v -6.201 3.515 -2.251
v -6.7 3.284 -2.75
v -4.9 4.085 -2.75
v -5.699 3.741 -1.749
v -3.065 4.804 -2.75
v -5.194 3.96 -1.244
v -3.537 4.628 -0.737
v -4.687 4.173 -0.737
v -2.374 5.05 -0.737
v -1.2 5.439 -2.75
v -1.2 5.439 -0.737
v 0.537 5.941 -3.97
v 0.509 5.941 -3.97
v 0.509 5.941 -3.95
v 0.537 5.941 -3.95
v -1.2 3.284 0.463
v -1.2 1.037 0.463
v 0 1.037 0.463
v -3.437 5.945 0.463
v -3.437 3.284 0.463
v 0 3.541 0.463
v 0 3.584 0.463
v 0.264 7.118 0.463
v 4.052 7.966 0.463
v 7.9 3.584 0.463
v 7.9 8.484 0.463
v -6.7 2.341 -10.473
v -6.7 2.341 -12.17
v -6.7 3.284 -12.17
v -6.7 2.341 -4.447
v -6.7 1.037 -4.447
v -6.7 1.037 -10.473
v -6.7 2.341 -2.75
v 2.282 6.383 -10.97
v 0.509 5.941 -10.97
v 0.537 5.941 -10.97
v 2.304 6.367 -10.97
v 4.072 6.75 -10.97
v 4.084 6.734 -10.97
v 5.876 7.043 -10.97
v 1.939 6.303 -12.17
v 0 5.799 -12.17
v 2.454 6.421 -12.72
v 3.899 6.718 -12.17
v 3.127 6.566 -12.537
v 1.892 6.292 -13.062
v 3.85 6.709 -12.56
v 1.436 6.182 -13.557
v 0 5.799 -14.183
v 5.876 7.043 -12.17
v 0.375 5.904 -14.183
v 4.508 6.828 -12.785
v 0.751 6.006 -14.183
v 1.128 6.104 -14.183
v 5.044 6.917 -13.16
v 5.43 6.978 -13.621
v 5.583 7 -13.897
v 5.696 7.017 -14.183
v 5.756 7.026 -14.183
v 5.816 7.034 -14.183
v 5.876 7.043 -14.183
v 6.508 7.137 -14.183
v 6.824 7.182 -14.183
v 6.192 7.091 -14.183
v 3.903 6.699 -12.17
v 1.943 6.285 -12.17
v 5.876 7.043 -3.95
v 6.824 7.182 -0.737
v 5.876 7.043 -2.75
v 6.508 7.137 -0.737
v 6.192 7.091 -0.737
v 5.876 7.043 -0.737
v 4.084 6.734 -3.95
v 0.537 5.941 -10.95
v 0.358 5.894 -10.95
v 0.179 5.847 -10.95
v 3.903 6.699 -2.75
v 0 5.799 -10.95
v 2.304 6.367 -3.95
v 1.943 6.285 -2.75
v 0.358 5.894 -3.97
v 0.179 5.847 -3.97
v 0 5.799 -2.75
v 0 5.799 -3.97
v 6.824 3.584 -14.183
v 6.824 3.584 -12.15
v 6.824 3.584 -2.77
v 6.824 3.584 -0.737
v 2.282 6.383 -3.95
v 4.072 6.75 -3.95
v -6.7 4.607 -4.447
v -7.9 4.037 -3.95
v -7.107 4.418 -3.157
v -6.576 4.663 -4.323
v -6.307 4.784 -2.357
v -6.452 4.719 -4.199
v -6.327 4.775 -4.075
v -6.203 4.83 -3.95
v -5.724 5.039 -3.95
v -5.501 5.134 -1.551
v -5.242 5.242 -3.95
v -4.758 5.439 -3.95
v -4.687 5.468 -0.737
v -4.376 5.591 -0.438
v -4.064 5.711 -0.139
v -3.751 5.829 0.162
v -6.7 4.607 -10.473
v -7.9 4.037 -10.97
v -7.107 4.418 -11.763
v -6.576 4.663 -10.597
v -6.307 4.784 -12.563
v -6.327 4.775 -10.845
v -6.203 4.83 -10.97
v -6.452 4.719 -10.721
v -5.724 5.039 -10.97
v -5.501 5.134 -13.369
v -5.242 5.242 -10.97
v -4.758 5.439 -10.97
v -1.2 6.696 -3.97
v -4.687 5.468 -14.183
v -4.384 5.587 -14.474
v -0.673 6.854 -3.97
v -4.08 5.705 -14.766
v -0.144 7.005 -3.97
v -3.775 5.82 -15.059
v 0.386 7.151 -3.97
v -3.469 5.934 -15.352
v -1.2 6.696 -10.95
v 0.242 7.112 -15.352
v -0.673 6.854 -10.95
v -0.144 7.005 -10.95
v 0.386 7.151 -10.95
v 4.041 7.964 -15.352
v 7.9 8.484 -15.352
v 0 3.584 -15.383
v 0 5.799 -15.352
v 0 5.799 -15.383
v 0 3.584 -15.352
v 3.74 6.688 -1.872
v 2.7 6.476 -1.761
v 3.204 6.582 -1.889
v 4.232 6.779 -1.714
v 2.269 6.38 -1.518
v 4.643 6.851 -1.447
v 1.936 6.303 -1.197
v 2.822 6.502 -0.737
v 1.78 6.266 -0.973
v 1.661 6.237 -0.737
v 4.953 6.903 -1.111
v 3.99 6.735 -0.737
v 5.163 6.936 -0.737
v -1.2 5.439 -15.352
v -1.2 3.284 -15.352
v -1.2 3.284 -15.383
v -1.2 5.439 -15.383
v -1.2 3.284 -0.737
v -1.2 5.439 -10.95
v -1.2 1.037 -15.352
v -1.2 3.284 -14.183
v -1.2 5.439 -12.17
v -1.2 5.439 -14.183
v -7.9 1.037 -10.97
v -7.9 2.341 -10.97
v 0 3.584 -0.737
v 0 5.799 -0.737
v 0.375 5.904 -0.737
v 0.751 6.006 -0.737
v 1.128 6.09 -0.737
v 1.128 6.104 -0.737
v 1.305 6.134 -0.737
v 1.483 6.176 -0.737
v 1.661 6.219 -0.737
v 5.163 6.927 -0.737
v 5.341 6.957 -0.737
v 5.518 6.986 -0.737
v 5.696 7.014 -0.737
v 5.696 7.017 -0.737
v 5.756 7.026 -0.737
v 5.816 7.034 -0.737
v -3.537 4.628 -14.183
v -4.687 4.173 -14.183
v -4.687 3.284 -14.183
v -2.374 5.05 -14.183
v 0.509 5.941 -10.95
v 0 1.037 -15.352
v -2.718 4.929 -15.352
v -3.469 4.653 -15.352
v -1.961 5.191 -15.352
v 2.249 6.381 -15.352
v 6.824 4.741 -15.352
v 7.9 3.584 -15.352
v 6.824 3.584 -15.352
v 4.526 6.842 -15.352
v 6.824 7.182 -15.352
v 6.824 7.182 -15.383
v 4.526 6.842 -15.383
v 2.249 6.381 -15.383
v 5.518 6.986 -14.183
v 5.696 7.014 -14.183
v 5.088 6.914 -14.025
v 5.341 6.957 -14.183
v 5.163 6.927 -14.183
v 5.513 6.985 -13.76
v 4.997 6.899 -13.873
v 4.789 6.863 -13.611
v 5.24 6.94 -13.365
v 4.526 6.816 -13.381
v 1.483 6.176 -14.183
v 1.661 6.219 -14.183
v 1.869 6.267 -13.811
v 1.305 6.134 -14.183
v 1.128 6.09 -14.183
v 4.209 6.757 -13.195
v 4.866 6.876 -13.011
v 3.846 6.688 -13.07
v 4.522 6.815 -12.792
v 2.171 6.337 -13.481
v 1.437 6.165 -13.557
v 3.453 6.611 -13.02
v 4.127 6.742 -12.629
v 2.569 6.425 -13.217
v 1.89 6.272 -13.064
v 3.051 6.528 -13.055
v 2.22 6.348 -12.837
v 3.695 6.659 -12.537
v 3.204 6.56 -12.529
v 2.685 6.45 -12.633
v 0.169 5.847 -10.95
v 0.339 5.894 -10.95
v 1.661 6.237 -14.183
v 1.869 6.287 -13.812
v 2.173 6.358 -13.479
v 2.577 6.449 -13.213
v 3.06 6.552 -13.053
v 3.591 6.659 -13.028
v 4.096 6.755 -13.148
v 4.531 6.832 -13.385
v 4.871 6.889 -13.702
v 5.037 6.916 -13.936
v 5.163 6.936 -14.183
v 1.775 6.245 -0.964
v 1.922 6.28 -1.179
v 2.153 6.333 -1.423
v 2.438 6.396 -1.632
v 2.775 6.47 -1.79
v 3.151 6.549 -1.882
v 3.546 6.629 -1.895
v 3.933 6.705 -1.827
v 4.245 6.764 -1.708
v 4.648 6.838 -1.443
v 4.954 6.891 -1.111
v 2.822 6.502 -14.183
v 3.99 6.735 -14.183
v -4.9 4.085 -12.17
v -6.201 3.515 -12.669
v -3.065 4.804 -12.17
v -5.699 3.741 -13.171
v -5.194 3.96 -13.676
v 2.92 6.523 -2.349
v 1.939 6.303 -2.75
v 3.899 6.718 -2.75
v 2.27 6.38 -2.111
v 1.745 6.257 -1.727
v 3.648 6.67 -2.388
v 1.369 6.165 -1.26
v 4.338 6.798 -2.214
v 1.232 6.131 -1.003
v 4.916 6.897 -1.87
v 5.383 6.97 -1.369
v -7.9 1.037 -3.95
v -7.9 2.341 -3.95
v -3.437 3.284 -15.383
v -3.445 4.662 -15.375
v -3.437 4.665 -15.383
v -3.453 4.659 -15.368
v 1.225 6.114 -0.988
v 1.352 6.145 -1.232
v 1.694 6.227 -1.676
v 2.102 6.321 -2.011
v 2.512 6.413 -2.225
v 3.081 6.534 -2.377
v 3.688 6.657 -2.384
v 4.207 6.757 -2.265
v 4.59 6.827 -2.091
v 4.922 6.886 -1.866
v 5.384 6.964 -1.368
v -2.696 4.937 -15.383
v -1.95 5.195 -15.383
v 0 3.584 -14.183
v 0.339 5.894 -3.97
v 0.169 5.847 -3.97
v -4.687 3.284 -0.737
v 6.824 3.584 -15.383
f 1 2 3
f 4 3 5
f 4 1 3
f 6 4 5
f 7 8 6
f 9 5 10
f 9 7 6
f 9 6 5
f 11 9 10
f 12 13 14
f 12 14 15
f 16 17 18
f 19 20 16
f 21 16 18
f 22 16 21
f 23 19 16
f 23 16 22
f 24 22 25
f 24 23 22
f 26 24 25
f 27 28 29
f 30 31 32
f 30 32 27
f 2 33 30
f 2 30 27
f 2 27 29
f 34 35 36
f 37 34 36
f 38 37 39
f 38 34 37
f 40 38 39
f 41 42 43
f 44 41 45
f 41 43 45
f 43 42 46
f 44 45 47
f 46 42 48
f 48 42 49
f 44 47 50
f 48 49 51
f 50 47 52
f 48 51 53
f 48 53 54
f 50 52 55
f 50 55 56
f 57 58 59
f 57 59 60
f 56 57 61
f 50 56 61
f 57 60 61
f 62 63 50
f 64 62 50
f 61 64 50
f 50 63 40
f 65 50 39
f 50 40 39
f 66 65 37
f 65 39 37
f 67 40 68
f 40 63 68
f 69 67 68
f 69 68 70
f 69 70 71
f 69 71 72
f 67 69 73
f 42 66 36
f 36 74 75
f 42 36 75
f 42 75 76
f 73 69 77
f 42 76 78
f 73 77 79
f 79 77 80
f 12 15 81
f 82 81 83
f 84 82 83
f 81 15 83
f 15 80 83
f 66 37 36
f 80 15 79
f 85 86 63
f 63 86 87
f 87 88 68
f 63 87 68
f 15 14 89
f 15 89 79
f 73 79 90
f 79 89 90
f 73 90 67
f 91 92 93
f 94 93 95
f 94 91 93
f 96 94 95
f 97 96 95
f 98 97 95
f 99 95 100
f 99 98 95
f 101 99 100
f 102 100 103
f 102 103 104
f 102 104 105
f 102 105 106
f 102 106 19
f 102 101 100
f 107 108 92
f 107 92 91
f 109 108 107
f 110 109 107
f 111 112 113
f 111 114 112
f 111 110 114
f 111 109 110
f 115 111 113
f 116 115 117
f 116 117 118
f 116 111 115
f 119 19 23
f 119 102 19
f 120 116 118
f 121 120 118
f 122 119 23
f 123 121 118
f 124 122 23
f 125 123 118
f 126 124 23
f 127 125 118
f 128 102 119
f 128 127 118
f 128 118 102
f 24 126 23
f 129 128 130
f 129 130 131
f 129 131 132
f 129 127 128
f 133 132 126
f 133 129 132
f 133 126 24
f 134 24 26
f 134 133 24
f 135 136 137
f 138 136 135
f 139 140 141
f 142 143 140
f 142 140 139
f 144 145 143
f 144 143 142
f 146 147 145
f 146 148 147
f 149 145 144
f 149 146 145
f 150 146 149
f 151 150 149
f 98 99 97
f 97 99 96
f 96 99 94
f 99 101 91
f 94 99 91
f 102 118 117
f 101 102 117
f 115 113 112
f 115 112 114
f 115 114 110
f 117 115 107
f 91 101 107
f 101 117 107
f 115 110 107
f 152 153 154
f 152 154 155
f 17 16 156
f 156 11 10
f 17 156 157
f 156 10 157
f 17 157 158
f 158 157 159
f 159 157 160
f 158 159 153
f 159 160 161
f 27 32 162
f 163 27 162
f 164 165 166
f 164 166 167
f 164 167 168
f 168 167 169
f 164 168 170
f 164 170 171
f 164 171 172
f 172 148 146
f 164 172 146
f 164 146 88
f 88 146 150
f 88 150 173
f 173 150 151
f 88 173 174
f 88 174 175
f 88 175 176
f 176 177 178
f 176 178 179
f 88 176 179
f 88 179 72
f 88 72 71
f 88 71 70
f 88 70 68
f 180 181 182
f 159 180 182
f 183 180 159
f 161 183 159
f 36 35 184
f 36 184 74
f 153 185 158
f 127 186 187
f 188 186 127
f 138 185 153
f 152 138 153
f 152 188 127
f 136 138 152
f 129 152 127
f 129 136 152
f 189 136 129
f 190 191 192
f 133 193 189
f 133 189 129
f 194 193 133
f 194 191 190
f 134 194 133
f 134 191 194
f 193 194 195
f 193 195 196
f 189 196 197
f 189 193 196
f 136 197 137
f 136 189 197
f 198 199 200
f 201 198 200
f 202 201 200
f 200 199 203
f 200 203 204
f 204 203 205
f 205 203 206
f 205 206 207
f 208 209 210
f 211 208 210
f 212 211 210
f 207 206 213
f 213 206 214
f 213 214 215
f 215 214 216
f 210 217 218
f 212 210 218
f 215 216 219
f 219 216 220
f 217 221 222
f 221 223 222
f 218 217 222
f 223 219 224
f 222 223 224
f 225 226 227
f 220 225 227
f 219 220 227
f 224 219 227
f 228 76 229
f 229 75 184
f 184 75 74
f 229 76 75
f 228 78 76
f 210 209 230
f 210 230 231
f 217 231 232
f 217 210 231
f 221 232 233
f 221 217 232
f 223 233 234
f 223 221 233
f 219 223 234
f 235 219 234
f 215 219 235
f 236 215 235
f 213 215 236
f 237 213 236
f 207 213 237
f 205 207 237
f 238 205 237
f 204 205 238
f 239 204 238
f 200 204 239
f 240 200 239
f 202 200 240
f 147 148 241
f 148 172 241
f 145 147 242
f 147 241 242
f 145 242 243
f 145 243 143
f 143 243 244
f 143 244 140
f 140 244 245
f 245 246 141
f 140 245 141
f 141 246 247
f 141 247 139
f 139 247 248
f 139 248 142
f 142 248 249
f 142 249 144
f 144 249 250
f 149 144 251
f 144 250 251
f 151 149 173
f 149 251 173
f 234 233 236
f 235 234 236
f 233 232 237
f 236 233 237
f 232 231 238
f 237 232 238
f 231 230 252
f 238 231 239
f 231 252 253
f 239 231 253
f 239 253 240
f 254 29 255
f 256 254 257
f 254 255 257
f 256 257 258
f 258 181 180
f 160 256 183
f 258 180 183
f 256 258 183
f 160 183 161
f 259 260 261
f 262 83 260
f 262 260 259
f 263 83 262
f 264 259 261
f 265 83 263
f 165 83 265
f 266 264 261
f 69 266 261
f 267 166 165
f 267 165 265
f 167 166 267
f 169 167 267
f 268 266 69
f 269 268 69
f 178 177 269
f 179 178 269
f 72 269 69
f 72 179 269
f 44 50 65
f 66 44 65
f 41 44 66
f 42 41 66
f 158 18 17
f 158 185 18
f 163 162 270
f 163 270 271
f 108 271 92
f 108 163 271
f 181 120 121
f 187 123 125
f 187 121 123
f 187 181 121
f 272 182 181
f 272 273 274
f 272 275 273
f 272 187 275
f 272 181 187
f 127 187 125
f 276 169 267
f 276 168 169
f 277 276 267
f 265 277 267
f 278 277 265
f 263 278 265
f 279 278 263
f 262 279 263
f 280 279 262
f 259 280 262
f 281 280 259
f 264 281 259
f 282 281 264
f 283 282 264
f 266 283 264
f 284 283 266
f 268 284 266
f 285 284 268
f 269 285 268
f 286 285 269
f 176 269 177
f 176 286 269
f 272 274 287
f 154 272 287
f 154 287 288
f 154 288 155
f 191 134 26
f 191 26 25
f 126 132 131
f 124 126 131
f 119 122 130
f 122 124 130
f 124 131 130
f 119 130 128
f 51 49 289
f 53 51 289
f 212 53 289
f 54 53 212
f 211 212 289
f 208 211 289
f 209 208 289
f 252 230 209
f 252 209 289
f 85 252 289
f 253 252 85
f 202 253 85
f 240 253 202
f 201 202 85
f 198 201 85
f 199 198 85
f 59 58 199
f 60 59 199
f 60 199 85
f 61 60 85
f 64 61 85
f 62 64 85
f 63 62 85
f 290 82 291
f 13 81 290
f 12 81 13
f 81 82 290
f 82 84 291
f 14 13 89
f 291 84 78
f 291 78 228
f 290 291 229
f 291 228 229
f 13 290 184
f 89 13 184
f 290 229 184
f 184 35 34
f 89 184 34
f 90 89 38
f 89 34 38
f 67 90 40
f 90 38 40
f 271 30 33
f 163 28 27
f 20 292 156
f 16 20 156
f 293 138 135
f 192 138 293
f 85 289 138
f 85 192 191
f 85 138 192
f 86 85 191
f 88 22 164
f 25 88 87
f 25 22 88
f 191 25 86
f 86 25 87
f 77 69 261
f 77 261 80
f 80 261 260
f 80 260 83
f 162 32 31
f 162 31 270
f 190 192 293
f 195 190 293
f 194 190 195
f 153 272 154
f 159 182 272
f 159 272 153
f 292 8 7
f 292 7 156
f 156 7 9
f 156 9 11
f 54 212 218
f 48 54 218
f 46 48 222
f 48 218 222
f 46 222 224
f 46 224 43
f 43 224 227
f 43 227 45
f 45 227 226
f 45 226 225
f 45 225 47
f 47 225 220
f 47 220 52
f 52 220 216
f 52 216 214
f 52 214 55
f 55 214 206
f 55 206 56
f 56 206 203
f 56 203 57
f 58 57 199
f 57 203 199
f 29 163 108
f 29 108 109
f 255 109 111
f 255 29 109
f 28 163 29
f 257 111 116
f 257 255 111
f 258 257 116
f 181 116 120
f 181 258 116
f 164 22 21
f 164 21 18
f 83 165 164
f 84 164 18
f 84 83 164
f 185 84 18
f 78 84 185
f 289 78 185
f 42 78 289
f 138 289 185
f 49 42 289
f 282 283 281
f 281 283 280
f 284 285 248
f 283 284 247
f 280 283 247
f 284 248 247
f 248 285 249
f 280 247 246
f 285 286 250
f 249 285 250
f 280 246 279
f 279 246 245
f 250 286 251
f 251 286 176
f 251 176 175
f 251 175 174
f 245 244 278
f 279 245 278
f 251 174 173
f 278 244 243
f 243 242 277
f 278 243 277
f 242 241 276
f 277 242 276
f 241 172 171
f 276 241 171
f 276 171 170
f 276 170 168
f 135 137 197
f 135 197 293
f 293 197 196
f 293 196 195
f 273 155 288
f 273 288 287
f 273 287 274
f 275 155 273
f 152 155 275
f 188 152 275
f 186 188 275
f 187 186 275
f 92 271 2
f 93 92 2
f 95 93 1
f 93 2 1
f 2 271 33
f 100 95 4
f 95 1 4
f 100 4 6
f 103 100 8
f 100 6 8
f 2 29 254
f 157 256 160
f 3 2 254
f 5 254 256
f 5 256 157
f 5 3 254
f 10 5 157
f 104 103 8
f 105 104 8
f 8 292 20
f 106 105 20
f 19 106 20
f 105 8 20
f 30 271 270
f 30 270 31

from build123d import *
from build123d.topology import SkipClean

# Parameters (mm, degrees)
BOSS_EXTRUDE1_DEPTH      = 3.95
SHELL1_T                 = -1.2
SKETCH3_W                = 6.823927471
SKETCH3_H                = 5.581929969
CUT_EXTRUDE1_DEPTH       = 2.4
BOSS_EXTRUDE3_REACH      = 14.559
BOSS_EXTRUDE3_END_RADIUS = 43.712775366
BOSS_EXTRUDE3_START      = -1.8
SKETCH4_R                = 2.4
SKETCH4_R_2              = 1.9
CUT_EXTRUDE4_REACH       = 13.553
BOSS_EXTRUDE4_START      = -3.51
BOSS_EXTRUDE4_DEPTH      = 3.51
SHELL2_START             = 3.540892579
SHELL2_OUTLINE_W         = 7.9
SHELL2_OUTLINE_H         = 6.98035738
SHELL2_DEPTH             = 3.609652258
SHELL2_START_2           = 1.037208095
SHELL2_2_DEPTH           = 4.401988613
SHELL2_START_3           = -10.97
SHELL2_3_DEPTH           = 7.02
SHELL2_4_DEPTH           = 7.02
CUT_EXTRUDE5_DEPTH       = 22.359542769
SKETCH16_W               = 22.82
SKETCH16_H               = 1.2435468
CUT_EXTRUDE10_DEPTH      = 7.9
SKETCH17_W               = 3.486934667
SKETCH17_H               = 7.447231284
SKETCH17_W_2             = 3.517769968
CUT_EXTRUDE11_DEPTH      = 27.03272194
CUT_EXTRUDE12_DEPTH      = 18.123431779
CUT_EXTRUDE13_DEPTH      = 20.609163221
BOSS_EXTRUDE5_DEPTH      = 1.2
SKETCH23_W               = 3.213065333
SKETCH23_H               = 2.258477707
SKETCH23_W_2             = 3.182230032
BOSS_EXTRUDE6_DEPTH      = 1.2
BOSS_EXTRUDE7_START      = -1.2
BOSS_EXTRUDE7_DEPTH      = 1.2
CUT_EXTRUDE14_DEPTH      = 19.031936029


with BuildPart() as part:
    # Sketch1 → Boss-Extrude1 (new, symmetric)
    with BuildSketch(Plane.XY):
        with BuildLine():
            Line((7.9, 8.484439379), (7.9, 5.540892579))
            Line((7.9, 5.540892579), (7.9, 2.340892579))
            Line((7.9, 2.340892579), (0, 2.340892579))
            Line((0, 2.340892579), (0, 1.037208095))
            Line((0, 1.037208095), (-7.9, 1.037208095))
            Line((-7.9, 1.037208095), (-7.9, 4.036739959))
            ThreePointArc((-7.9, 4.036739959), (-0.204910293, 6.988512651), (7.9, 8.484439379))
        make_face()
    extrude(amount=BOSS_EXTRUDE1_DEPTH, both=True)

    # Shell1
    shell1_openings = [part.faces().sort_by_distance(p)[0] for p in [
        (-3.95, 1.037208095, 0),
    ]]
    offset(amount=SHELL1_T, openings=shell1_openings, kind=Kind.INTERSECTION)

    # Sketch3 → Cut-Extrude1 (cut)
    with BuildSketch(Plane.XZ.offset(-2.340892579)):
        with Locations((3.411963736, 0.021143674)):
            Rectangle(SKETCH3_W, SKETCH3_H)
    extrude(amount=-CUT_EXTRUDE1_DEPTH, mode=Mode.SUBTRACT)

    # Boss-Extrude3: up to this cylinder (the profile starts inside it)
    boss_extrude3_end = Plane(origin=(11.965039047, -36.243995073, 2.332118), z_dir=(0, 0, -1)) * Cylinder(BOSS_EXTRUDE3_END_RADIUS, 117.543550731, mode=Mode.PRIVATE)
    # Sketch4 → Boss-Extrude3 (add, up to the surface)
    with BuildSketch(Plane(origin=(0, 2.340892579, 0), x_dir=(-1, 0, 0), z_dir=(0, -1, 0)).offset(BOSS_EXTRUDE3_START), mode=Mode.PRIVATE) as boss_extrude3_sk1:
        with Locations(Location((-3.411963735, 0, 0), (0, 0, 90))):
            Circle(SKETCH4_R)
        with Locations(Location((-3.411963735, 0, 0), (0, 0, 90))):
            Circle(SKETCH4_R_2, mode=Mode.SUBTRACT)
    boss_extrude3_tool1 = extrude(boss_extrude3_sk1.sketch, amount=-BOSS_EXTRUDE3_REACH, mode=Mode.PRIVATE) & boss_extrude3_end
    add(boss_extrude3_tool1.solids().sort_by_distance((3.411964, 4.140893, 2.332118))[0])

    # Sketch7 → Cut-Extrude4 (cut, up to next)
    with BuildSketch(Plane(origin=(0, 1.037208095, 0), x_dir=(-1, 0, 0), z_dir=(0, -1, 0)), mode=Mode.PRIVATE) as cut_extrude4_sk1:
        Polygon((7.9, 3.95), (0, -3.95), (7.9, -3.95), align=None)
    cut_extrude4_tool1 = extrude(cut_extrude4_sk1.sketch, amount=-CUT_EXTRUDE4_REACH, mode=Mode.PRIVATE) & part.part
    add(cut_extrude4_tool1.solids().sort_by_distance((-5.266667, 1.037208, 1.316667))[0], mode=Mode.SUBTRACT)

    # Sketch8 → Boss-Extrude4 (add)
    with BuildSketch(Plane(origin=(0, 0, -7.46), x_dir=(-1, 0, 0), z_dir=(0, 0, -1)).offset(BOSS_EXTRUDE4_START)):
        with BuildLine():
            Line((-7.9, 7.189017048), (-7.9, 2.340892579))
            Line((-7.9, 2.340892579), (0, 2.340892579))
            Line((0, 2.340892579), (0, 1.037208095))
            Line((0, 1.037208095), (7.9, 1.037208095))
            Line((7.9, 1.037208095), (7.9, 4.036739959))
            ThreePointArc((7.9, 4.036739959), (0.204910293, 6.988512651), (-7.9, 8.484439379))
            Line((-7.9, 8.484439379), (-7.9, 7.189017048))
        make_face()
    extrude(amount=BOSS_EXTRUDE4_DEPTH)

    # Mirror1: part across plane


with BuildPart() as part_1:
    add(part.part)
    add(part.part.mirror(Plane(origin=(0, 0, -7.46), x_dir=(1, 0, 0), z_dir=(0, 0, -1))))

    # Shell2: read off the stored shape, not the designer's step
    # Shell2 outline → Shell2 (cut)
    with BuildSketch(Plane(origin=(0, 0, 0), x_dir=(1, 0, 0), z_dir=(0, 1, 0)).offset(SHELL2_START)):
        with Locations((2.75, 7.46)):
            Rectangle(SHELL2_OUTLINE_W, SHELL2_OUTLINE_H)
    extrude(amount=SHELL2_DEPTH, mode=Mode.SUBTRACT)

    # Shell2 2 outline → Shell2 2 (cut)
    with BuildSketch(Plane(origin=(0, 0, 0), x_dir=(1, 0, 0), z_dir=(0, 1, 0)).offset(SHELL2_START_2)):
        Polygon((-1.2, 3.95), (-1.2, 10.97), (-6.202943725, 10.97), (-6.7, 10.472943725), (-6.7, 4.447056275), (-6.202943725, 3.95), align=None)
    extrude(amount=SHELL2_2_DEPTH, mode=Mode.SUBTRACT)

    # Shell2 3 outline → Shell2 3 (cut)
    with BuildSketch(Plane.XY.offset(SHELL2_START_3)):
        with BuildLine():
            ThreePointArc((6.7, 7.150544837), (3.582625992, 6.65754198), (0.508949666, 5.940892579))
            Line((0.508949666, 5.940892579), (6.7, 5.940892579))
            Line((6.7, 5.940892579), (6.7, 7.150544837))
        make_face()
    extrude(amount=SHELL2_3_DEPTH, mode=Mode.SUBTRACT)

    # Shell2 4 outline → Shell2 4 (add)
    with SkipClean():  # the faces are left unmerged after this step: merging them gives an invalid solid
        with BuildSketch(Plane.XY.offset(SHELL2_START_3)):
            with BuildLine():
                ThreePointArc((-4.75826547, 5.439196708), (-5.7340289, 5.034333198), (-6.7, 4.606631708))
                Line((-6.7, 4.606631708), (-6.7, 3.283502287))
                ThreePointArc((-6.7, 3.283502287), (-3.986456885, 4.454364939), (-1.2, 5.439196708))
                Line((-1.2, 5.439196708), (-4.75826547, 5.439196708))
            make_face()
            with BuildLine():
                ThreePointArc((0.386122992, 7.150544837), (-0.40902625, 6.930533287), (-1.2, 6.69595297))
                Line((-1.2, 6.69595297), (-1.2, 5.439196708))
                ThreePointArc((-1.2, 5.439196708), (2.710357921, 6.477868269), (6.7, 7.150544837))
                Line((6.7, 7.150544837), (0.386122992, 7.150544837))
            make_face()
        extrude(amount=SHELL2_4_DEPTH)
    add(part_1.part.scale(1), mode=Mode.REPLACE)  # the faces are merged on a copy

    # Sketch10 → Cut-Extrude5 (cut, through all)
    with BuildSketch(Plane(origin=(0, 2.340892579, 0), x_dir=(-1, 0, 0), z_dir=(0, -1, 0))):
        Polygon((1.2, 12.17), (1.2, 10.97), (6.202943725, 10.97), (6.7, 10.472943725), (7.9, 10.97), (6.7, 12.17), align=None)
        Polygon((1.2, 2.75), (6.7, 2.75), (7.9, 3.95), (6.7, 4.447056275), (6.202943725, 3.95), (1.2, 3.95), align=None)
    extrude(amount=CUT_EXTRUDE5_DEPTH, mode=Mode.SUBTRACT)

    # Sketch16 → Cut-Extrude10 (cut)
    with BuildSketch(Plane(origin=(7.9, 0, 0), x_dir=(0, 0, -1), z_dir=(1, 0, 0))):
        with Locations((7.46, 2.962665979)):
            Rectangle(SKETCH16_W, SKETCH16_H)
    extrude(amount=-CUT_EXTRUDE10_DEPTH, mode=Mode.SUBTRACT)

    # Sketch17 → Cut-Extrude11 (cut, through all)
    with BuildSketch(Plane(origin=(7.9, 0, 0), x_dir=(0, 0, -1), z_dir=(1.0, -1.5823538232397524e-12, 0))):
        with Locations((-2.206532667, 4.760823737)):
            Rectangle(SKETCH17_W, SKETCH17_H)
        with Locations((17.111115016, 4.760823737)):
            Rectangle(SKETCH17_W_2, SKETCH17_H)
    extrude(amount=-CUT_EXTRUDE11_DEPTH, mode=Mode.SUBTRACT)

    # Sketch18 → Cut-Extrude12 (cut, through all)
    with BuildSketch(Plane.XY.offset(-2.75)):
        with BuildLine():
            Line((-1.2, 2.340892579), (-6.7, 2.340892579))
            Line((-6.7, 2.340892579), (-6.7, 3.283502287))
            ThreePointArc((-6.7, 3.283502287), (-3.986456885, 4.454364939), (-1.2, 5.439196708))
            Line((-1.2, 5.439196708), (-1.2, 3.540892579))
            Line((-1.2, 3.540892579), (-1.2, 2.340892579))
        make_face()
    extrude(amount=-CUT_EXTRUDE12_DEPTH, mode=Mode.SUBTRACT)

    # Sketch19 → Cut-Extrude13 (cut, through all)
    with BuildSketch(Plane.XY.offset(0.463065333)):
        with BuildLine():
            Line((0, 5.799370286), (0, 3.540892579))
            Line((0, 3.540892579), (6.823927471, 3.584439379))
            Line((6.823927471, 3.584439379), (6.823927471, 7.181547539))
            ThreePointArc((6.823927471, 7.181547539), (3.39019483, 6.597933861), (0, 5.799370286))
        make_face()
    extrude(amount=-CUT_EXTRUDE13_DEPTH, mode=Mode.SUBTRACT)

    # Sketch20 → Boss-Extrude5 (add)
    with BuildSketch(Plane(origin=(0, 0, 0), x_dir=(0, 0, -1), z_dir=(1, 0, 0))):
        Polygon((3.96982131, 3.540892579), (3.953429775, 6.436658409), (10.966345521, 6.396961672), (10.95017869, 3.540892579), align=None)
    extrude(amount=-BOSS_EXTRUDE5_DEPTH)

    # Sketch23 → Boss-Extrude6 (add)
    with BuildSketch(Plane(origin=(0, 0, 0), x_dir=(0, 0, -1), z_dir=(1, 0, 0))):
        with Locations((1.143467334, 4.670131432)):
            Rectangle(SKETCH23_W, SKETCH23_H)
        with Locations((13.761115016, 4.670131432)):
            Rectangle(SKETCH23_W_2, SKETCH23_H)
    extrude(amount=-BOSS_EXTRUDE6_DEPTH)

    # Sketch25 → Boss-Extrude7 (add)
    with BuildSketch(Plane.XY.offset(0.463065333).offset(BOSS_EXTRUDE7_START)):
        with BuildLine():
            Line((6.823927471, 3.584439379), (6.823927471, 7.181547539))
            ThreePointArc((6.823927471, 7.181547539), (3.384337724, 6.626850897), (0, 5.799370286))
            Line((0, 5.799370286), (0, 3.584439379))
            Line((0, 3.584439379), (6.823927471, 3.584439379))
        make_face()
        with BuildLine():
            Line((-6.7, 3.283502287), (-1.2, 3.283502287))
            Line((-1.2, 3.283502287), (-1.2, 5.439196708))
            ThreePointArc((-1.2, 5.439196708), (-3.986456885, 4.454364939), (-6.7, 3.283502287))
        make_face()
    boss_extrude7 = extrude(amount=BOSS_EXTRUDE7_DEPTH)

    # Sketch28 → Cut-Extrude14 (cut, through all)
    with BuildSketch(Plane.XZ.offset(-3.283502287)):
        Polygon((-4.686934667, -0.736934667), (-3.437061956, 0.463065333), (-6.7, 0.463065333), (-6.7, -0.736934667), align=None)
    cut_extrude14 = extrude(amount=-CUT_EXTRUDE14_DEPTH, mode=Mode.SUBTRACT)

    # Mirror2: Boss-Extrude7, Cut-Extrude14 across plane
    add(boss_extrude7.mirror(Plane(origin=(0, 0, -7.46), x_dir=(1, 0, 0), z_dir=(0, 0, -1))))
    add(cut_extrude14.mirror(Plane(origin=(0, 0, -7.46), x_dir=(1, 0, 0), z_dir=(0, 0, -1))), mode=Mode.SUBTRACT)


solid = part_1.part
